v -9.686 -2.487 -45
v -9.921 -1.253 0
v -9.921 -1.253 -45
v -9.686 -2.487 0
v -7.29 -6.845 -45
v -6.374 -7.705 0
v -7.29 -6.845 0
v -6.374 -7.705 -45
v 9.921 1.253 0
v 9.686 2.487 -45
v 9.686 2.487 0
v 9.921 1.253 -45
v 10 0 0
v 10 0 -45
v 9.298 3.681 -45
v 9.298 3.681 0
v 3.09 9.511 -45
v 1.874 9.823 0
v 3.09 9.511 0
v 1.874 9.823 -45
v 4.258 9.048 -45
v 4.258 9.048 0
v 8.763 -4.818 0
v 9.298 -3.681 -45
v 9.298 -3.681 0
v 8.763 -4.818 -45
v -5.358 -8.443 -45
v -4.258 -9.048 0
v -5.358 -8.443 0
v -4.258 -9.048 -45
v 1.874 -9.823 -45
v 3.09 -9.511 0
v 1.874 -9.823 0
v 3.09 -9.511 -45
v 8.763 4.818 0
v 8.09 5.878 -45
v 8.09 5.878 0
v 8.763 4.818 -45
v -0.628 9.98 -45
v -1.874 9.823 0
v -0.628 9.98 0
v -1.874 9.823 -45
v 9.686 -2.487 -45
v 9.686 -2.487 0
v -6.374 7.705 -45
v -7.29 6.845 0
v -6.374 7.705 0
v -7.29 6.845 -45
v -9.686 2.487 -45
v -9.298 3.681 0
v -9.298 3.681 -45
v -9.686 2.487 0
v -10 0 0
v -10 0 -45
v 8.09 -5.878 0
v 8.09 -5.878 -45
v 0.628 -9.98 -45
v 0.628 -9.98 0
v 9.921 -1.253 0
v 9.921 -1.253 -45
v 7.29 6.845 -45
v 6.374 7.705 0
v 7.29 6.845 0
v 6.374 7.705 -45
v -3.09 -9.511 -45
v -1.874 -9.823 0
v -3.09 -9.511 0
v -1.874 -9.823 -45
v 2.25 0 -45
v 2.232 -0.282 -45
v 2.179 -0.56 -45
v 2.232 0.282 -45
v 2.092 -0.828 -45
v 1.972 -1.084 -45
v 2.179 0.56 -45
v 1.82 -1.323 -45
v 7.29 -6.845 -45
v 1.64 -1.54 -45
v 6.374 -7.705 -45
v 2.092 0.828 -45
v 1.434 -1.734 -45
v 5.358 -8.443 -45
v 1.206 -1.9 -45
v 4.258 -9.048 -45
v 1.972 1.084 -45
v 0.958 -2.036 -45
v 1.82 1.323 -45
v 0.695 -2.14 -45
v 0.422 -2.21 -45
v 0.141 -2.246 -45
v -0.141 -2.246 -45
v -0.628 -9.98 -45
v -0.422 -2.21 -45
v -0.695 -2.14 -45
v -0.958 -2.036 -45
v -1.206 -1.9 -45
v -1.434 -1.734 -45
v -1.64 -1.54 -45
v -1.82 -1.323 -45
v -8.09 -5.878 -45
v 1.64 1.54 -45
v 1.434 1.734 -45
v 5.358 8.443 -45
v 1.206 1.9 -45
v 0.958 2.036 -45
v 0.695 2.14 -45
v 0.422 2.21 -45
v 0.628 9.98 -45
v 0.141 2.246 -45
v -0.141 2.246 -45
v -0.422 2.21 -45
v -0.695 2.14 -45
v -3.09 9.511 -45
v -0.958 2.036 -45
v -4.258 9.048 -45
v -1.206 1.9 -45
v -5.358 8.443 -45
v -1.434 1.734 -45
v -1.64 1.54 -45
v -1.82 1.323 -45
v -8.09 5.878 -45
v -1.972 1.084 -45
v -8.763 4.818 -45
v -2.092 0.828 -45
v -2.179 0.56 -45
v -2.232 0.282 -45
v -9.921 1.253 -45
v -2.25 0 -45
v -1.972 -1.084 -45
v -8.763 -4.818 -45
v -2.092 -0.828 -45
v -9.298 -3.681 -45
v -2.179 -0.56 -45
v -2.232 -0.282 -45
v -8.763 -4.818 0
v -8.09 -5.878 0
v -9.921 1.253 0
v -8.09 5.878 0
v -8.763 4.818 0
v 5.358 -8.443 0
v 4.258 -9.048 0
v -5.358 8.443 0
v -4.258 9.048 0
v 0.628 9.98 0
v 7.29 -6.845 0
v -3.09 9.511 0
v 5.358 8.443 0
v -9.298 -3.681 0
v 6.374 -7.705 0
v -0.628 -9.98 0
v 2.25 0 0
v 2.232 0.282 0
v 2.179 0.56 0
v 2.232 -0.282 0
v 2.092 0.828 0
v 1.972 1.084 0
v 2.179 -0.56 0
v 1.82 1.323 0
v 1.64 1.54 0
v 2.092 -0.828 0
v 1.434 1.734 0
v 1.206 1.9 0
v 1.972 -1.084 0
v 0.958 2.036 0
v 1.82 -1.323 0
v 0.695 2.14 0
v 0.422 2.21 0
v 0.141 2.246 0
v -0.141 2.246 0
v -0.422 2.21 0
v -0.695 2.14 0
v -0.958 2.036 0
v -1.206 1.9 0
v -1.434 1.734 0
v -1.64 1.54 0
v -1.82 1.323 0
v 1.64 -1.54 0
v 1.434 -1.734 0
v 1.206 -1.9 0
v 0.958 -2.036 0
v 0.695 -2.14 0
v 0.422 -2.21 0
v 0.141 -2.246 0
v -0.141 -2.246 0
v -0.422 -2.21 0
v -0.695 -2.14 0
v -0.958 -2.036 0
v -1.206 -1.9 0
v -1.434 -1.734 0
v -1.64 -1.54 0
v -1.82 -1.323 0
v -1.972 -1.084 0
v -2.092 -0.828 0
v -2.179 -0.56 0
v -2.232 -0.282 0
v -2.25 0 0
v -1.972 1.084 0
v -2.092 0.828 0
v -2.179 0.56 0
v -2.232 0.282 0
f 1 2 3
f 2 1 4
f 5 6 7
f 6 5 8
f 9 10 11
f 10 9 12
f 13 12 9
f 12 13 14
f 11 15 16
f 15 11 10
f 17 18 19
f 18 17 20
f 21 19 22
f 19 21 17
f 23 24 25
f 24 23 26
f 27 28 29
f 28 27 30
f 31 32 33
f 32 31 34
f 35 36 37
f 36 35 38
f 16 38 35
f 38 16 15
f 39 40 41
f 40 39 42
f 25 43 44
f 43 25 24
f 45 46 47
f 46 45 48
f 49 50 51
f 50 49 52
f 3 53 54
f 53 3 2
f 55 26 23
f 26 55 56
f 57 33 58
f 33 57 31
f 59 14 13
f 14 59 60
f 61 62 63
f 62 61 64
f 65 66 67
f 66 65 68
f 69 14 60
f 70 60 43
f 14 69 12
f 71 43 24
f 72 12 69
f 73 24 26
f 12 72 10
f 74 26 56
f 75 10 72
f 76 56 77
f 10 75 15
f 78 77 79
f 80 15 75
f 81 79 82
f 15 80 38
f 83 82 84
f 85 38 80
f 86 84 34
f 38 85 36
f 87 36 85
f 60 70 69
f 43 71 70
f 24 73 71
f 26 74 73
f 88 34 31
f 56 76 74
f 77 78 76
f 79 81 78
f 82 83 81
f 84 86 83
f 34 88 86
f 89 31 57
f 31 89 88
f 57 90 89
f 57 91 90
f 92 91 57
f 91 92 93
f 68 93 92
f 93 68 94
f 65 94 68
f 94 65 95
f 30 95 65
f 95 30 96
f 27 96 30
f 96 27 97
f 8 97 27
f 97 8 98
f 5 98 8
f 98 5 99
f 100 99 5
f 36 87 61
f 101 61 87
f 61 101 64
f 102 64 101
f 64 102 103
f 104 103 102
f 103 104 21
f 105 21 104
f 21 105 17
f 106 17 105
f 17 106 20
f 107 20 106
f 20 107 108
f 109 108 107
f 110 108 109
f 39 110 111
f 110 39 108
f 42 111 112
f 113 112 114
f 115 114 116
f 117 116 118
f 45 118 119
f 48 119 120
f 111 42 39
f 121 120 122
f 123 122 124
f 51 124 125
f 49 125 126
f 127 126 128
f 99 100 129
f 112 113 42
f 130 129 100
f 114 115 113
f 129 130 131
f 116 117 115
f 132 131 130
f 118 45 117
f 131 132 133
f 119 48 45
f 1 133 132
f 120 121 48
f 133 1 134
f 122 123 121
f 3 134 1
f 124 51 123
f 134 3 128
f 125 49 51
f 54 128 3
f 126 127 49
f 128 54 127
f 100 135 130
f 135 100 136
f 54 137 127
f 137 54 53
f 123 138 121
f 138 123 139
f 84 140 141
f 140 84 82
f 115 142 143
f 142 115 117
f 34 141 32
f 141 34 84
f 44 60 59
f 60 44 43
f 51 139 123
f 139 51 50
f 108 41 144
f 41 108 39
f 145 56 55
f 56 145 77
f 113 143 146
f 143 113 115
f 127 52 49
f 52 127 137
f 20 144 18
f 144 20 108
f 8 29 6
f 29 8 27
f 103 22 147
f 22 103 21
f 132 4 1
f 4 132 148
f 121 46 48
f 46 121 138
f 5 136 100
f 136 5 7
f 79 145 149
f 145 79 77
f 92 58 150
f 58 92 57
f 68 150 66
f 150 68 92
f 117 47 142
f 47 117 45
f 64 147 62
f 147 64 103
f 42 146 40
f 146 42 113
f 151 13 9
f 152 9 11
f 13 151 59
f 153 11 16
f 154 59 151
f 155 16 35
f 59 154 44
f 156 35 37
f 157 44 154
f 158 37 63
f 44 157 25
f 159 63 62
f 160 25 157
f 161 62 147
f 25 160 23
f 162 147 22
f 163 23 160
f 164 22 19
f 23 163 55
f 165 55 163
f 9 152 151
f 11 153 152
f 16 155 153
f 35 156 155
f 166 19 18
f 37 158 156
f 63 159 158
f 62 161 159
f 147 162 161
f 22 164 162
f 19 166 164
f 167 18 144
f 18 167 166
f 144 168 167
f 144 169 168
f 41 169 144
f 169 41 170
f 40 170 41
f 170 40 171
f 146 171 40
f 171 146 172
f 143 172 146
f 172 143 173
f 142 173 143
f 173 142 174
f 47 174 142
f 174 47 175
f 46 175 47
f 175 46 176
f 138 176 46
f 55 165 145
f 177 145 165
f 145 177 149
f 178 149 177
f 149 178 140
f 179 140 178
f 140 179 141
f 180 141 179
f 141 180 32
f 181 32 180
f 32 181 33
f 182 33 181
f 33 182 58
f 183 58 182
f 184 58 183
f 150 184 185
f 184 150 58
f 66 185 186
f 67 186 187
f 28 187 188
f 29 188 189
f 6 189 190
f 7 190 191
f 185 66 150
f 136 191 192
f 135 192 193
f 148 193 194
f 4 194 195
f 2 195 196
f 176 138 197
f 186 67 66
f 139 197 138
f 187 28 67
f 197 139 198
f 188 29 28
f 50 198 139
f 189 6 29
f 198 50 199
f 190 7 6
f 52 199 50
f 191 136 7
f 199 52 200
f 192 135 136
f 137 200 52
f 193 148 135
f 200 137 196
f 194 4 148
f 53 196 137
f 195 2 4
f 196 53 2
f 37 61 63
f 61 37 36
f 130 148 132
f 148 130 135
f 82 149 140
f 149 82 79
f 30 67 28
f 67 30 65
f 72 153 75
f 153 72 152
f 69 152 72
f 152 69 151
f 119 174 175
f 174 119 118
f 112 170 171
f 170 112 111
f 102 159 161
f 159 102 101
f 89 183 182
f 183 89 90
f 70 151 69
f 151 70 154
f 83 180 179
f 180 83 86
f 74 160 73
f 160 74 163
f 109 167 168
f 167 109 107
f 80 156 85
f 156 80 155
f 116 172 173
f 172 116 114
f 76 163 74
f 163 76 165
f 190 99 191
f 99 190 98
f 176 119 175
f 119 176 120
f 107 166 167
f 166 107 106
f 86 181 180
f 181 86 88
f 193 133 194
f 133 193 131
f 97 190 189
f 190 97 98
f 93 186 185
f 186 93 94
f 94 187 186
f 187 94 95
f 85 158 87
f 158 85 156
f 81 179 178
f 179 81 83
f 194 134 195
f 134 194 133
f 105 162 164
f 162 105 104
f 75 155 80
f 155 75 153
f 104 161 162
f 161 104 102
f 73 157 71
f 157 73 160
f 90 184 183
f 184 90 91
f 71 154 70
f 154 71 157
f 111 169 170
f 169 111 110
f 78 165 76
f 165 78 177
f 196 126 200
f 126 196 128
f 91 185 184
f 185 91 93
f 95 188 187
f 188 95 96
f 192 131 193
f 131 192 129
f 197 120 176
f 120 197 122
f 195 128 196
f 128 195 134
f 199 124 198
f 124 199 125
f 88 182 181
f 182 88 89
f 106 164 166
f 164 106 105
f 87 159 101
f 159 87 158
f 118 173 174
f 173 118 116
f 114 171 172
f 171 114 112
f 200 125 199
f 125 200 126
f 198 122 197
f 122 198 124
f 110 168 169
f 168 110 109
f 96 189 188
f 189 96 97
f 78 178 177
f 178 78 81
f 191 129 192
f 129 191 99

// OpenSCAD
$fn = 50;


difference() {
	union() {
		translate(v = [0, 0, -45.0000000000]) {
			cylinder(h = 45, r = 10.0000000000);
		}
		cylinder(h = 0, r = 19.0000000000);
	}
	union() {
		#translate(v = [0, 0, -45]) {
			cylinder(h = 45, r = 2.2500000000);
		}
	}
}
